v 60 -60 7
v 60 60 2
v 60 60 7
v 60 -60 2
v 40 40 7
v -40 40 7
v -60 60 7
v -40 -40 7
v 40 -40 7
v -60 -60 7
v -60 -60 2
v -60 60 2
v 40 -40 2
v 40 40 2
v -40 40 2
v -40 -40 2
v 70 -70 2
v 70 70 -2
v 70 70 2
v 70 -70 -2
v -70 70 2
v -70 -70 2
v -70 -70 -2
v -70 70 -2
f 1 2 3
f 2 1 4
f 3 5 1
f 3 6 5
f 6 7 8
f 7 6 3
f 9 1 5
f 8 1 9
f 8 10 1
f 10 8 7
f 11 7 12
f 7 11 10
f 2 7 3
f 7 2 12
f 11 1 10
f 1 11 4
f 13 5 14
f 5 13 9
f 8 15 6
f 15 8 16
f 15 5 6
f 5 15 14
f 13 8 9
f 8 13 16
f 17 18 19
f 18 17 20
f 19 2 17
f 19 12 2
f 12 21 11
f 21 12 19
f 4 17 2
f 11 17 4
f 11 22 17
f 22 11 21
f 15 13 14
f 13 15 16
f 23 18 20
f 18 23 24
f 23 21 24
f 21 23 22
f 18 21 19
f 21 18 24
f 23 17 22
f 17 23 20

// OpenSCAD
$fa = 1;
$fs = 0.04;
e = 0.01;

module plate() {
    union() {
        cube([140, 140, 4], center=true);

    }
}

module light_trap() {
    difference() {
        cube([120, 120, 6], center=true);
        cube([80, 80, 6 + e], center=true);
    }
}

module lens_board() {
    plate();
    translate([0, 0, 4])
        light_trap();
}

lens_board();
